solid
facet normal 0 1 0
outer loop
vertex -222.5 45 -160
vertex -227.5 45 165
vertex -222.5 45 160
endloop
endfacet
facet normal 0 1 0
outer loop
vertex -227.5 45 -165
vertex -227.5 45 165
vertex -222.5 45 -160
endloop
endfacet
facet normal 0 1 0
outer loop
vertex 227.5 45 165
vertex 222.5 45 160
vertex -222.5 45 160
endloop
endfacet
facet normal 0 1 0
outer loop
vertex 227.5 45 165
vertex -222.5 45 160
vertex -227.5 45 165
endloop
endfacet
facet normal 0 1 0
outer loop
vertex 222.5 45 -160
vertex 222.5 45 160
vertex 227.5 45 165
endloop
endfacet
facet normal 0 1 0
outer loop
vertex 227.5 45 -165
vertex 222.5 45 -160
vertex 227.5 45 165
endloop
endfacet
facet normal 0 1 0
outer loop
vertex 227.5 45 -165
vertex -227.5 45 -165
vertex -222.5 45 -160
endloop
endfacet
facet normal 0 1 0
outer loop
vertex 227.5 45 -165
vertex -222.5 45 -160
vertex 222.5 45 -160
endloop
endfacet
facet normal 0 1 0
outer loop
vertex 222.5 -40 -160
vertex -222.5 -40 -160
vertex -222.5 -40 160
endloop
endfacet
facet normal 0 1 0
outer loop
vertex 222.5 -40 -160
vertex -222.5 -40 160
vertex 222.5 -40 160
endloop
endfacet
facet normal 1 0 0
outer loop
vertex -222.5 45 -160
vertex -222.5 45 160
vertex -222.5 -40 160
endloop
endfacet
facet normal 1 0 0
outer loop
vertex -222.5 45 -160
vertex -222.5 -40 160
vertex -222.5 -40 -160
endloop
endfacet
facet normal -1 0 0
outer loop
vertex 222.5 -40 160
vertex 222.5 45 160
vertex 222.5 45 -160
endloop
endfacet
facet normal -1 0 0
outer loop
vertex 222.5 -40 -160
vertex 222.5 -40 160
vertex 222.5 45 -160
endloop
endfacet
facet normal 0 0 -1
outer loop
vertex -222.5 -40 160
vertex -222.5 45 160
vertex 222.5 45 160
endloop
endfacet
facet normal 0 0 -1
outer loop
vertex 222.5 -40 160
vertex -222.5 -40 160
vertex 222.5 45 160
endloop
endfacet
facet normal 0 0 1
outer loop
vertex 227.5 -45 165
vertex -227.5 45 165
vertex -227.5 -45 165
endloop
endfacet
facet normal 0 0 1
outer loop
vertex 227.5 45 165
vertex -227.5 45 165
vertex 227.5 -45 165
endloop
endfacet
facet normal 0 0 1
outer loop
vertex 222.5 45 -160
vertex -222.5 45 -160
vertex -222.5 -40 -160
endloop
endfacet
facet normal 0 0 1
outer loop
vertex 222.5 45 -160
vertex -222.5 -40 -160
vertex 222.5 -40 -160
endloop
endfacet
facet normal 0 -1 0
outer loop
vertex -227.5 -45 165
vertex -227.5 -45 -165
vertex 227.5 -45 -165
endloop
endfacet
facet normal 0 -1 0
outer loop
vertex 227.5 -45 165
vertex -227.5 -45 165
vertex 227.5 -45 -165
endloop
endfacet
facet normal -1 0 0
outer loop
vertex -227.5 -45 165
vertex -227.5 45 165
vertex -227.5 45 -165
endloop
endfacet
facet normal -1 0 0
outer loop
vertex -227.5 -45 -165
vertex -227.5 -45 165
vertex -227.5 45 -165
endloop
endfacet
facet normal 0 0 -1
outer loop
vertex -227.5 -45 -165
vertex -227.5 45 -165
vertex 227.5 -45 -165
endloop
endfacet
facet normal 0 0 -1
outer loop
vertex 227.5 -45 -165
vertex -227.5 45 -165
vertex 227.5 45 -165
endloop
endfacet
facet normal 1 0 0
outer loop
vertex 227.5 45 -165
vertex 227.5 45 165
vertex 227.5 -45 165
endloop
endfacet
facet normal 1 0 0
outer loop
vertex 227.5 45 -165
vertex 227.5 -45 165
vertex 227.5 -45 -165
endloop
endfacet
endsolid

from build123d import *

# Parameters (mm, degrees)
SKETCH1_W           = 455
SKETCH1_H           = 330
BOSS_EXTRUDE1_DEPTH = 45
SHELL1_T            = -5


with BuildPart() as part:
    # Sketch1 → Boss-Extrude1 (new, symmetric)
    with BuildSketch(Plane(origin=(0, 0, 0), x_dir=(1, 0, 0), z_dir=(0, 1, 0))):
        Rectangle(SKETCH1_W, SKETCH1_H)
    extrude(amount=BOSS_EXTRUDE1_DEPTH, both=True)

    # Shell1
    shell1_openings = [part.faces().sort_by_distance(p)[0] for p in [
        (0, 45, 0),
    ]]
    offset(amount=SHELL1_T, openings=shell1_openings, kind=Kind.INTERSECTION)


solid = part.part
